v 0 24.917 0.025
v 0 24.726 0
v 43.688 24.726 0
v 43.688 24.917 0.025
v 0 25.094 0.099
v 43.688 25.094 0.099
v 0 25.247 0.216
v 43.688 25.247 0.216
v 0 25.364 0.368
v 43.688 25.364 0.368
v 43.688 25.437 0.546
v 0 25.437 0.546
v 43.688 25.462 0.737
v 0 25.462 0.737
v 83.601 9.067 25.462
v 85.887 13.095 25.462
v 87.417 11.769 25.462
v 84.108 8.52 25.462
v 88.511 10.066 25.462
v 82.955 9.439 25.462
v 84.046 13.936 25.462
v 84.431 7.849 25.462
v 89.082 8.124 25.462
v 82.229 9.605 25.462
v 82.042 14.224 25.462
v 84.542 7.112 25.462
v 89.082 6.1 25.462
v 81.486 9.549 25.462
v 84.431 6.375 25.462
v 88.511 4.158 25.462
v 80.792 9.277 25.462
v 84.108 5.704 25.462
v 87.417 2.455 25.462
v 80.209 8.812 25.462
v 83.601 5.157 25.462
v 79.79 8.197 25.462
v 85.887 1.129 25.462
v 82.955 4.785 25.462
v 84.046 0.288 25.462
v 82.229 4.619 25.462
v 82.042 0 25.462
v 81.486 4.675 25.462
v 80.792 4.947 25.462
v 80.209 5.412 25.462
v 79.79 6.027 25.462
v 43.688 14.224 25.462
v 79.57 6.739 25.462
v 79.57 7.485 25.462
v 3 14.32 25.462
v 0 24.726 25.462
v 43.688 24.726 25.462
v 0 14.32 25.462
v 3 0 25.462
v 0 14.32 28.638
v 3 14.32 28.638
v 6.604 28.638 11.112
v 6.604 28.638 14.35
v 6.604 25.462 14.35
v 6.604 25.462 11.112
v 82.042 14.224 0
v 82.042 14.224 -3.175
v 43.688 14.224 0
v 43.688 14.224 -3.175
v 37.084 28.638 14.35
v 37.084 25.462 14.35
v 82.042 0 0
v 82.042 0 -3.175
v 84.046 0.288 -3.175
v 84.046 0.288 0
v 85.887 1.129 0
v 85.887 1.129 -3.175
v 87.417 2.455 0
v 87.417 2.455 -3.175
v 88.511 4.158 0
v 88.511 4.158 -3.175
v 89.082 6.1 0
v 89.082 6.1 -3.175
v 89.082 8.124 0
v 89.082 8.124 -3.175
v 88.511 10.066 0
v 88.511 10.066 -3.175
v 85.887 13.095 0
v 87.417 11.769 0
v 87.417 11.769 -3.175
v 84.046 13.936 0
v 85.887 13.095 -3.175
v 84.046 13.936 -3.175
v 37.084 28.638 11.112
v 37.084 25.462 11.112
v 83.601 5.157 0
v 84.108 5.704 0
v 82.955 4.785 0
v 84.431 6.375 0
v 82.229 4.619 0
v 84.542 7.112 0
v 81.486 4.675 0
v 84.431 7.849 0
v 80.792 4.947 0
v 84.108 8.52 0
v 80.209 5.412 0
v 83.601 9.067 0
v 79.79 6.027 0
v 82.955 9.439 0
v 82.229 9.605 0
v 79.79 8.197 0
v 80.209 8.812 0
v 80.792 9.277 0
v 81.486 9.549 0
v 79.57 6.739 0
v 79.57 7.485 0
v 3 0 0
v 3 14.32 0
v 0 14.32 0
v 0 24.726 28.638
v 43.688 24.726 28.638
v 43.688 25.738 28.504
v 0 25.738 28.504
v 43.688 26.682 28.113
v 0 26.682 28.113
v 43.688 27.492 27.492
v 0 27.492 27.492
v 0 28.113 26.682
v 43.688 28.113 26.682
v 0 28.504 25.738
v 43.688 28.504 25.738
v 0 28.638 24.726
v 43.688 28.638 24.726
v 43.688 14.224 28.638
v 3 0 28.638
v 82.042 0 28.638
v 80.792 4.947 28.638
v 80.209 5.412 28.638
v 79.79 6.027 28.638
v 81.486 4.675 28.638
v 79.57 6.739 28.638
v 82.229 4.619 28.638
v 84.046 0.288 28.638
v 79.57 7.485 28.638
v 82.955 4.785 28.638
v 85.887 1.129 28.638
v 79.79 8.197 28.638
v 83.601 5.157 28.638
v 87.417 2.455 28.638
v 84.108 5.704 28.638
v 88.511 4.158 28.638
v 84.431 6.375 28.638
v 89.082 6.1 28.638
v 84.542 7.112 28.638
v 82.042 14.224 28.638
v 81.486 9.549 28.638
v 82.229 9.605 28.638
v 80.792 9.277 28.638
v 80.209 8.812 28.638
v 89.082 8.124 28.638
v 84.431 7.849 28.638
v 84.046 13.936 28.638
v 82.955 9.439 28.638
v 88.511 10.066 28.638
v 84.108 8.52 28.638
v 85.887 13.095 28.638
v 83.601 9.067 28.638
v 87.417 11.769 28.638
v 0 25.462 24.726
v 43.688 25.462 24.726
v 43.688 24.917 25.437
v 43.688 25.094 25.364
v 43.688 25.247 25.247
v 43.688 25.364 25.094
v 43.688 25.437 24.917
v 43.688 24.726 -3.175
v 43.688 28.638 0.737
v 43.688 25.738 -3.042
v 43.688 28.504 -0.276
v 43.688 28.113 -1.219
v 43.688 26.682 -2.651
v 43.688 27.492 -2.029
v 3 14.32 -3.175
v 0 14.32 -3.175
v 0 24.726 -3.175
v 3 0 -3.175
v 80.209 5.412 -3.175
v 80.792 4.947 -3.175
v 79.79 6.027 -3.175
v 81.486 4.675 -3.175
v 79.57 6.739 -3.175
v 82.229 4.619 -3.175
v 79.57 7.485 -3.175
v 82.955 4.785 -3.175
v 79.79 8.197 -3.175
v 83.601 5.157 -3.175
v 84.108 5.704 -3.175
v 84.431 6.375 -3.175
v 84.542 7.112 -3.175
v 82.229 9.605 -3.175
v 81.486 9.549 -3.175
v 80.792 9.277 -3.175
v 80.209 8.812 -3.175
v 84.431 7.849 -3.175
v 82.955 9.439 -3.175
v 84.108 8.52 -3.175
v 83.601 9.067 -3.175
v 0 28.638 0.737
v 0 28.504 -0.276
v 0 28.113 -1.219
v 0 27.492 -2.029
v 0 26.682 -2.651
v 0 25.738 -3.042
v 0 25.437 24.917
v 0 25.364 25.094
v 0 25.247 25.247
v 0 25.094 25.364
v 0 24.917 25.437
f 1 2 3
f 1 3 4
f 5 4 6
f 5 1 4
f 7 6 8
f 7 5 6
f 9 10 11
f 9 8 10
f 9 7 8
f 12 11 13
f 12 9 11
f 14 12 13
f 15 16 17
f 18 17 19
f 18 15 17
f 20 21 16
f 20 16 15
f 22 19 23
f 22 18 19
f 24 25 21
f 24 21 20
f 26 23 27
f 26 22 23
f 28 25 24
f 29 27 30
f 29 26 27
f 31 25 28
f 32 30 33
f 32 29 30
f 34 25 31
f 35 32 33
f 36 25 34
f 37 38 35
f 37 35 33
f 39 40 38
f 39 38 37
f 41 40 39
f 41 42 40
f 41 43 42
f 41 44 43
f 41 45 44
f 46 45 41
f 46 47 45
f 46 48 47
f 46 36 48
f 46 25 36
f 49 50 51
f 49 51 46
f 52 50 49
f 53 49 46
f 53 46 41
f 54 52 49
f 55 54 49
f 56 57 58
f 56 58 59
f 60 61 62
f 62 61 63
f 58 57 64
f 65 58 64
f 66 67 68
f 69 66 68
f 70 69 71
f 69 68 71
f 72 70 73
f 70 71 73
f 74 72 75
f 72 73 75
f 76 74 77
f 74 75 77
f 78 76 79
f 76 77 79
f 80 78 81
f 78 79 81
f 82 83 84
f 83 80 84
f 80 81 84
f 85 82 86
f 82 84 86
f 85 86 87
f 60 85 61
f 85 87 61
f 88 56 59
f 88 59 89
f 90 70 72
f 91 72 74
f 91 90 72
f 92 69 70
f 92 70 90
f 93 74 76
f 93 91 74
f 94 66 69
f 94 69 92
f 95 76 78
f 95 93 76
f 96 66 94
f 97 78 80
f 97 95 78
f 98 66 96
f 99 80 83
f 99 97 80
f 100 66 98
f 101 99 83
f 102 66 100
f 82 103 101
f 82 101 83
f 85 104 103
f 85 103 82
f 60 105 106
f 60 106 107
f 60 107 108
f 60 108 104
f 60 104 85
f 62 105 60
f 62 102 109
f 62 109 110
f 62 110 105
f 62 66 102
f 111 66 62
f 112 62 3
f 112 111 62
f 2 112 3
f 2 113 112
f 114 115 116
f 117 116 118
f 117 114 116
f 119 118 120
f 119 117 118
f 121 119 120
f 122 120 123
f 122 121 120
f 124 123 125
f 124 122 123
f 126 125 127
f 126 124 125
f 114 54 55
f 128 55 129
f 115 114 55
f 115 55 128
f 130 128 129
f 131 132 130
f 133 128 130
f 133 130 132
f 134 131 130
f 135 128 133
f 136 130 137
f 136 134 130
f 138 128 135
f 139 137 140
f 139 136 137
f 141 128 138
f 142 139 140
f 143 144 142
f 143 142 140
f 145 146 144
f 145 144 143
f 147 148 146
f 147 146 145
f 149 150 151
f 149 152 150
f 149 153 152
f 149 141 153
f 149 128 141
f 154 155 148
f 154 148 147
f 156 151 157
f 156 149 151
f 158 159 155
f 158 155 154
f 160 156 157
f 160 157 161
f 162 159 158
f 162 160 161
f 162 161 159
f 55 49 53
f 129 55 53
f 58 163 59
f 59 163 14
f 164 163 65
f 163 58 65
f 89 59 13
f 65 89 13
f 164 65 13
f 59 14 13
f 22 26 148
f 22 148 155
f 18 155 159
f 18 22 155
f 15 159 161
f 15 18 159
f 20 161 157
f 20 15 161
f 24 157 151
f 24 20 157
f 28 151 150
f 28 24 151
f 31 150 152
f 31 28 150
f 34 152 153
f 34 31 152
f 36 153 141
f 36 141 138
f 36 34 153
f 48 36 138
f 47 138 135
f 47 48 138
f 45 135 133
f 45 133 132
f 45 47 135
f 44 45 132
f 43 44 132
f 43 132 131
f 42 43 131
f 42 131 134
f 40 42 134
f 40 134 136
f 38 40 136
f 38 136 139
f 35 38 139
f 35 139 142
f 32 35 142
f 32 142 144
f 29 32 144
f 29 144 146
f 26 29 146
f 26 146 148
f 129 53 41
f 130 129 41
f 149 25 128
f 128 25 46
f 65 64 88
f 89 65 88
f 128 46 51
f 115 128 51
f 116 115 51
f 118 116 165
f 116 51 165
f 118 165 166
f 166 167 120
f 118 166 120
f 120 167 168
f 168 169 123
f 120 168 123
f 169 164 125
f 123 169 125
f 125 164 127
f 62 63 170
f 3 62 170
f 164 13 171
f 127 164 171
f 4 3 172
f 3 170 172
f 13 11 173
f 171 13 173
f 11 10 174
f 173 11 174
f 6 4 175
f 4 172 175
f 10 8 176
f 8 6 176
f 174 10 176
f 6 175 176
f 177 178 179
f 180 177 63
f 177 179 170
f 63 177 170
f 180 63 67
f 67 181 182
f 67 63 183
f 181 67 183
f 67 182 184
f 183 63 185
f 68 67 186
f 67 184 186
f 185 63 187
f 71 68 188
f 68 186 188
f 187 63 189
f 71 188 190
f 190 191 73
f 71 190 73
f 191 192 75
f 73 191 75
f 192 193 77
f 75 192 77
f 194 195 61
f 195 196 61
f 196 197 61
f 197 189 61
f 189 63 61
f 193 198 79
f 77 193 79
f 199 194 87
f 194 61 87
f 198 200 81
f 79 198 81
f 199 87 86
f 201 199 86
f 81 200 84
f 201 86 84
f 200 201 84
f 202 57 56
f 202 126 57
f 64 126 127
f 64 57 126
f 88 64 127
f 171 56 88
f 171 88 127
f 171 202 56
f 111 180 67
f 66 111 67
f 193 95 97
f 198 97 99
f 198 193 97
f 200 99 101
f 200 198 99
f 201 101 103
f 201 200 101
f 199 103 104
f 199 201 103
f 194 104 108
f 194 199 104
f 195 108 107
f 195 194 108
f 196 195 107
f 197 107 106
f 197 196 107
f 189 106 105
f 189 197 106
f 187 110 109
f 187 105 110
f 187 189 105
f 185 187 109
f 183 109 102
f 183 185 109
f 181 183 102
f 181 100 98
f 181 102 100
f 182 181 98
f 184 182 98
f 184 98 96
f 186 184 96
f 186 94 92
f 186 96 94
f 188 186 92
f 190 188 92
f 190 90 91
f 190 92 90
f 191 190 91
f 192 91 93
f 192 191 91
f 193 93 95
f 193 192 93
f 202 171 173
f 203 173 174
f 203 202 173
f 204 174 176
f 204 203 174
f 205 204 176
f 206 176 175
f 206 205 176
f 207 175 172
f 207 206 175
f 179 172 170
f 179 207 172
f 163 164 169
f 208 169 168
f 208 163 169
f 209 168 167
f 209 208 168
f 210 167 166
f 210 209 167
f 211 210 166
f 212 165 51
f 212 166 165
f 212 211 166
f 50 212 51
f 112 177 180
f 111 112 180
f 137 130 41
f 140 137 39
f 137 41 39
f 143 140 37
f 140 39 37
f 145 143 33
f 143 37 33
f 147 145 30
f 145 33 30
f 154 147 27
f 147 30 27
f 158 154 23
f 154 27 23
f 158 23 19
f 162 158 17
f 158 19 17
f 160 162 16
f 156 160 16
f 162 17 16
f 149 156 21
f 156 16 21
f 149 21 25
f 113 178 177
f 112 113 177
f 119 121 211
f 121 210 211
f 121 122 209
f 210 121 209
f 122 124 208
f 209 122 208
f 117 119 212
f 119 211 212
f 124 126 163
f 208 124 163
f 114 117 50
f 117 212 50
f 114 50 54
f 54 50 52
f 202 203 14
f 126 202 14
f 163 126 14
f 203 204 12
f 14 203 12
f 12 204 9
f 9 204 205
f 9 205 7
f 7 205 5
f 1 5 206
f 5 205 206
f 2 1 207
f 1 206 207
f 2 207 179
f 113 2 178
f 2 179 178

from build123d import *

# Parameters (mm, degrees)
SALIENTE_EXTRUIR1_DEPTH         = 43.688
CROQUIS2_W                      = 3
CROQUIS2_H                      = 14.32
CORTAR_EXTRUIR1_DEPTH           = 43.688
CROQUIS3_W                      = 30.48
CROQUIS3_H                      = 3.2375
CORTAR_EXTRUIR2_DEPTH           = 43.688
CROQUIS4_R                      = 2.5
SALIENTE_EXTRUIR2_DEPTH         = 31.8125
CROQUIS5_W                      = 45.466
CROQUIS5_H                      = 25.4625
CORTAR_EXTRUIR3_DEPTH           = 43.688
DESPLEGAR_PLIEGUES5_OUTLINE_W   = 91
DESPLEGAR_PLIEGUES5_OUTLINE_H   = 3.175
DESPLEGAR_PLIEGUES5_DEPTH       = 25.4625
DESPLEGAR_START                 = 25.4625
DESPLEGAR_PLIEGUES5_2_OUTLINE_R = 2.5
DESPLEGAR_PLIEGUES5_2_DEPTH     = 3.175
PROCESAR_START                  = -27.639987743
PROCESAR_PLIEGUES5_OUTLINE_W    = 43.688
PROCESAR_PLIEGUES5_OUTLINE_H    = 3.175
PROCESAR_PLIEGUES5_DEPTH        = 24.464987743
PROCESAR_START_2                = 28.6375
PROCESAR_PLIEGUES5_2_OUTLINE_W  = 43.688
PROCESAR_PLIEGUES5_2_OUTLINE_H  = 3.175
PROCESAR_PLIEGUES5_2_DEPTH      = 24.464987743
PROCESAR_START_3                = -3.175
PROCESAR_PLIEGUES5_3_OUTLINE_R  = 2.5
PROCESAR_PLIEGUES5_3_DEPTH      = 3.9116
PROCESAR_START_4                = 24.7259
PROCESAR_PLIEGUES5_4_OUTLINE_R  = 2.5
PROCESAR_PLIEGUES5_4_DEPTH      = 3.9116
PROCESAR_PLIEGUES5_5_OUTLINE_W  = 3.175
PROCESAR_PLIEGUES5_5_OUTLINE_H  = 14.224
PROCESAR_PLIEGUES5_5_DEPTH      = 90


with BuildPart() as part:
    # Croquis1 → Saliente-Extruir1 (new body)
    with BuildSketch(Plane(origin=(0, 0, 0), x_dir=(0, 0, -1), z_dir=(1, 0, 0))):
        Polygon((-28.6375, 0), (-28.6375, 28.6375), (3.175, 28.6375), (3.175, 0), (0, 0), (0, 25.4625), (-25.4625, 25.4625), (-25.4625, 0), align=None)
    extrude(amount=SALIENTE_EXTRUIR1_DEPTH)

    # Croquis2 → Cortar-Extruir1 (cut)
    with BuildSketch(Plane.XY.offset(28.6375)):
        with Locations((1.5, 7.16)):
            Rectangle(CROQUIS2_W, CROQUIS2_H)
    extrude(amount=-CORTAR_EXTRUIR1_DEPTH, mode=Mode.SUBTRACT)

    # Croquis3 → Cortar-Extruir2 (cut)
    with BuildSketch(Plane(origin=(0, 28.6375, 0), x_dir=(1, 0, 0), z_dir=(0, 1, 0))):
        with Locations((21.844, -12.73125)):
            Rectangle(CROQUIS3_W, CROQUIS3_H)
    extrude(amount=-CORTAR_EXTRUIR2_DEPTH, mode=Mode.SUBTRACT)

    # Croquis4 → Saliente-Extruir2 (add)
    with BuildSketch(Plane.XY.offset(28.6375)):
        with BuildLine():
            Line((43.688, 14.224), (82.042, 14.224))
            ThreePointArc((82.042, 14.224), (89.154, 7.112), (82.042, 0))
            Line((82.042, 0), (43.688, 0))
            Line((43.688, 0), (43.688, 14.224))
        make_face()
        with Locations((82.042, 7.112)):
            Circle(CROQUIS4_R, mode=Mode.SUBTRACT)
    extrude(amount=-SALIENTE_EXTRUIR2_DEPTH)

    # Croquis5 → Cortar-Extruir3 (cut)
    with BuildSketch(Plane(origin=(0, 14.224, 0), x_dir=(1, 0, 0), z_dir=(0, 1, 0))):
        with Locations((66.421, -12.73125)):
            Rectangle(CROQUIS5_W, CROQUIS5_H)
    extrude(amount=-CORTAR_EXTRUIR3_DEPTH, mode=Mode.SUBTRACT)

    # Desplegar pliegues5: read off the stored shape, not the designer's step
    # Desplegar pliegues5 outline → Desplegar pliegues5 (cut)
    with BuildSketch(Plane(origin=(0, 0, 0), x_dir=(1, 0, 0), z_dir=(0, 1, 0))):
        with Locations((45.5, -27.05)):
            Rectangle(DESPLEGAR_PLIEGUES5_OUTLINE_W, DESPLEGAR_PLIEGUES5_OUTLINE_H)
        with Locations((45.5, 1.5875)):
            Rectangle(DESPLEGAR_PLIEGUES5_OUTLINE_W, DESPLEGAR_PLIEGUES5_OUTLINE_H)
    extrude(amount=DESPLEGAR_PLIEGUES5_DEPTH, mode=Mode.SUBTRACT)

    # Desplegar pliegues5 2 outline → Desplegar pliegues5 2 (add)
    # profile 1 of 2: a face of its own
    with BuildSketch(Plane(origin=(0, 0, 0), x_dir=(1, 0, 0), z_dir=(0, 1, 0)).offset(DESPLEGAR_START)):
        with BuildLine():
            Line((0, -28.6375), (0, -38.782487743))
            Line((0, -38.782487743), (3, -38.782487743))
            Line((3, -38.782487743), (3, -53.102487743))
            Line((3, -53.102487743), (82.042, -53.102487743))
            ThreePointArc((82.042, -53.102487743), (89.154, -45.990487743), (82.042, -38.878487743))
            Line((82.042, -38.878487743), (43.688, -38.878487743))
            Line((43.688, -38.878487743), (43.688, -28.6375))
            Line((43.688, -28.6375), (0, -28.6375))
        make_face()
        with Locations((82.042, -45.990487743)):
            Circle(DESPLEGAR_PLIEGUES5_2_OUTLINE_R, mode=Mode.SUBTRACT)
    # profile 2 of 2: a face of its own
    with BuildSketch(Plane(origin=(0, 0, 0), x_dir=(1, 0, 0), z_dir=(0, 1, 0)).offset(DESPLEGAR_START)):
        with BuildLine():
            Line((3, 27.639987743), (3, 13.319987743))
            Line((3, 13.319987743), (0, 13.319987743))
            Line((0, 13.319987743), (0, 3.175))
            Line((0, 3.175), (43.688, 3.175))
            Line((43.688, 3.175), (43.688, 13.415987743))
            Line((43.688, 13.415987743), (82.042, 13.415987743))
            ThreePointArc((82.042, 13.415987743), (89.154, 20.527987743), (82.042, 27.639987743))
            Line((82.042, 27.639987743), (3, 27.639987743))
        make_face()
        with Locations((82.042, 20.527987743)):
            Circle(DESPLEGAR_PLIEGUES5_2_OUTLINE_R, mode=Mode.SUBTRACT)
    extrude(amount=DESPLEGAR_PLIEGUES5_2_DEPTH)

    # Procesar pliegues5: read off the stored shape, not the designer's step
    # Procesar pliegues5 outline → Procesar pliegues5 (cut)
    with BuildSketch(Plane.XY.offset(PROCESAR_START)):
        with Locations((21.844, 27.05)):
            Rectangle(PROCESAR_PLIEGUES5_OUTLINE_W, PROCESAR_PLIEGUES5_OUTLINE_H)
    extrude(amount=PROCESAR_PLIEGUES5_DEPTH, mode=Mode.SUBTRACT)

    # Procesar pliegues5 2 outline → Procesar pliegues5 2 (cut)
    with BuildSketch(Plane.XY.offset(PROCESAR_START_2)):
        with Locations((21.844, 27.05)):
            Rectangle(PROCESAR_PLIEGUES5_2_OUTLINE_W, PROCESAR_PLIEGUES5_2_OUTLINE_H)
    extrude(amount=PROCESAR_PLIEGUES5_2_DEPTH, mode=Mode.SUBTRACT)

    # Procesar pliegues5 3 outline → Procesar pliegues5 3 (add)
    with BuildSketch(Plane.XY.offset(PROCESAR_START_3)):
        with BuildLine():
            Line((3, 14.32), (3, 0))
            Line((3, 0), (82.042, 0))
            ThreePointArc((82.042, 0), (89.154, 7.112), (82.042, 14.224))
            Line((82.042, 14.224), (43.688, 14.224))
            Line((43.688, 14.224), (43.688, 25.4625))
            Line((43.688, 25.4625), (0, 25.4625))
            Line((0, 25.4625), (0, 14.32))
            Line((0, 14.32), (3, 14.32))
        make_face()
        with Locations((82.042, 7.112)):
            Circle(PROCESAR_PLIEGUES5_3_OUTLINE_R, mode=Mode.SUBTRACT)
    extrude(amount=PROCESAR_PLIEGUES5_3_DEPTH)

    # Procesar pliegues5 4 outline → Procesar pliegues5 4 (add)
    with BuildSketch(Plane.XY.offset(PROCESAR_START_4)):
        with BuildLine():
            Line((3, 14.32), (3, 0))
            Line((3, 0), (82.042, 0))
            ThreePointArc((82.042, 0), (89.154, 7.112), (82.042, 14.224))
            Line((82.042, 14.224), (43.688, 14.224))
            Line((43.688, 14.224), (43.688, 25.4625))
            Line((43.688, 25.4625), (0, 25.4625))
            Line((0, 25.4625), (0, 14.32))
            Line((0, 14.32), (3, 14.32))
        make_face()
        with Locations((82.042, 7.112)):
            Circle(PROCESAR_PLIEGUES5_4_OUTLINE_R, mode=Mode.SUBTRACT)
    extrude(amount=PROCESAR_PLIEGUES5_4_DEPTH)

    # Procesar pliegues5 5 outline → Procesar pliegues5 5 (cut)
    with BuildSketch(Plane.YZ):
        with BuildLine():
            Line((0, 0.7366), (0, 0))
            Line((0, 0), (24.7259, 0))
            ThreePointArc((24.7259, 0), (25.246754855, 0.215745145), (25.4625, 0.7366))
            Line((25.4625, 0.7366), (0, 0.7366))
        make_face()
        with BuildLine():
            ThreePointArc((24.7259, 28.6375), (27.491818885, 27.491818885), (28.6375, 24.7259))
            Line((28.6375, 24.7259), (28.6375, 28.6375))
            Line((28.6375, 28.6375), (24.7259, 28.6375))
        make_face()
        with BuildLine():
            ThreePointArc((28.6375, 0.7366), (27.491818885, -2.029318885), (24.7259, -3.175))
            Line((24.7259, -3.175), (28.6375, -3.175))
            Line((28.6375, -3.175), (28.6375, 0.7366))
        make_face()
        with BuildLine():
            ThreePointArc((25.4625, 24.7259), (25.246754855, 25.246754855), (24.7259, 25.4625))
            Line((24.7259, 25.4625), (0, 25.4625))
            Line((0, 25.4625), (0, 24.7259))
            Line((0, 24.7259), (25.4625, 24.7259))
        make_face()
        with Locations((27.05, 45.990487743)):
            Rectangle(PROCESAR_PLIEGUES5_5_OUTLINE_W, PROCESAR_PLIEGUES5_5_OUTLINE_H)
        with Locations((27.05, -20.527987743)):
            Rectangle(PROCESAR_PLIEGUES5_5_OUTLINE_W, PROCESAR_PLIEGUES5_5_OUTLINE_H)
    extrude(amount=PROCESAR_PLIEGUES5_5_DEPTH, mode=Mode.SUBTRACT)


solid = part.part
